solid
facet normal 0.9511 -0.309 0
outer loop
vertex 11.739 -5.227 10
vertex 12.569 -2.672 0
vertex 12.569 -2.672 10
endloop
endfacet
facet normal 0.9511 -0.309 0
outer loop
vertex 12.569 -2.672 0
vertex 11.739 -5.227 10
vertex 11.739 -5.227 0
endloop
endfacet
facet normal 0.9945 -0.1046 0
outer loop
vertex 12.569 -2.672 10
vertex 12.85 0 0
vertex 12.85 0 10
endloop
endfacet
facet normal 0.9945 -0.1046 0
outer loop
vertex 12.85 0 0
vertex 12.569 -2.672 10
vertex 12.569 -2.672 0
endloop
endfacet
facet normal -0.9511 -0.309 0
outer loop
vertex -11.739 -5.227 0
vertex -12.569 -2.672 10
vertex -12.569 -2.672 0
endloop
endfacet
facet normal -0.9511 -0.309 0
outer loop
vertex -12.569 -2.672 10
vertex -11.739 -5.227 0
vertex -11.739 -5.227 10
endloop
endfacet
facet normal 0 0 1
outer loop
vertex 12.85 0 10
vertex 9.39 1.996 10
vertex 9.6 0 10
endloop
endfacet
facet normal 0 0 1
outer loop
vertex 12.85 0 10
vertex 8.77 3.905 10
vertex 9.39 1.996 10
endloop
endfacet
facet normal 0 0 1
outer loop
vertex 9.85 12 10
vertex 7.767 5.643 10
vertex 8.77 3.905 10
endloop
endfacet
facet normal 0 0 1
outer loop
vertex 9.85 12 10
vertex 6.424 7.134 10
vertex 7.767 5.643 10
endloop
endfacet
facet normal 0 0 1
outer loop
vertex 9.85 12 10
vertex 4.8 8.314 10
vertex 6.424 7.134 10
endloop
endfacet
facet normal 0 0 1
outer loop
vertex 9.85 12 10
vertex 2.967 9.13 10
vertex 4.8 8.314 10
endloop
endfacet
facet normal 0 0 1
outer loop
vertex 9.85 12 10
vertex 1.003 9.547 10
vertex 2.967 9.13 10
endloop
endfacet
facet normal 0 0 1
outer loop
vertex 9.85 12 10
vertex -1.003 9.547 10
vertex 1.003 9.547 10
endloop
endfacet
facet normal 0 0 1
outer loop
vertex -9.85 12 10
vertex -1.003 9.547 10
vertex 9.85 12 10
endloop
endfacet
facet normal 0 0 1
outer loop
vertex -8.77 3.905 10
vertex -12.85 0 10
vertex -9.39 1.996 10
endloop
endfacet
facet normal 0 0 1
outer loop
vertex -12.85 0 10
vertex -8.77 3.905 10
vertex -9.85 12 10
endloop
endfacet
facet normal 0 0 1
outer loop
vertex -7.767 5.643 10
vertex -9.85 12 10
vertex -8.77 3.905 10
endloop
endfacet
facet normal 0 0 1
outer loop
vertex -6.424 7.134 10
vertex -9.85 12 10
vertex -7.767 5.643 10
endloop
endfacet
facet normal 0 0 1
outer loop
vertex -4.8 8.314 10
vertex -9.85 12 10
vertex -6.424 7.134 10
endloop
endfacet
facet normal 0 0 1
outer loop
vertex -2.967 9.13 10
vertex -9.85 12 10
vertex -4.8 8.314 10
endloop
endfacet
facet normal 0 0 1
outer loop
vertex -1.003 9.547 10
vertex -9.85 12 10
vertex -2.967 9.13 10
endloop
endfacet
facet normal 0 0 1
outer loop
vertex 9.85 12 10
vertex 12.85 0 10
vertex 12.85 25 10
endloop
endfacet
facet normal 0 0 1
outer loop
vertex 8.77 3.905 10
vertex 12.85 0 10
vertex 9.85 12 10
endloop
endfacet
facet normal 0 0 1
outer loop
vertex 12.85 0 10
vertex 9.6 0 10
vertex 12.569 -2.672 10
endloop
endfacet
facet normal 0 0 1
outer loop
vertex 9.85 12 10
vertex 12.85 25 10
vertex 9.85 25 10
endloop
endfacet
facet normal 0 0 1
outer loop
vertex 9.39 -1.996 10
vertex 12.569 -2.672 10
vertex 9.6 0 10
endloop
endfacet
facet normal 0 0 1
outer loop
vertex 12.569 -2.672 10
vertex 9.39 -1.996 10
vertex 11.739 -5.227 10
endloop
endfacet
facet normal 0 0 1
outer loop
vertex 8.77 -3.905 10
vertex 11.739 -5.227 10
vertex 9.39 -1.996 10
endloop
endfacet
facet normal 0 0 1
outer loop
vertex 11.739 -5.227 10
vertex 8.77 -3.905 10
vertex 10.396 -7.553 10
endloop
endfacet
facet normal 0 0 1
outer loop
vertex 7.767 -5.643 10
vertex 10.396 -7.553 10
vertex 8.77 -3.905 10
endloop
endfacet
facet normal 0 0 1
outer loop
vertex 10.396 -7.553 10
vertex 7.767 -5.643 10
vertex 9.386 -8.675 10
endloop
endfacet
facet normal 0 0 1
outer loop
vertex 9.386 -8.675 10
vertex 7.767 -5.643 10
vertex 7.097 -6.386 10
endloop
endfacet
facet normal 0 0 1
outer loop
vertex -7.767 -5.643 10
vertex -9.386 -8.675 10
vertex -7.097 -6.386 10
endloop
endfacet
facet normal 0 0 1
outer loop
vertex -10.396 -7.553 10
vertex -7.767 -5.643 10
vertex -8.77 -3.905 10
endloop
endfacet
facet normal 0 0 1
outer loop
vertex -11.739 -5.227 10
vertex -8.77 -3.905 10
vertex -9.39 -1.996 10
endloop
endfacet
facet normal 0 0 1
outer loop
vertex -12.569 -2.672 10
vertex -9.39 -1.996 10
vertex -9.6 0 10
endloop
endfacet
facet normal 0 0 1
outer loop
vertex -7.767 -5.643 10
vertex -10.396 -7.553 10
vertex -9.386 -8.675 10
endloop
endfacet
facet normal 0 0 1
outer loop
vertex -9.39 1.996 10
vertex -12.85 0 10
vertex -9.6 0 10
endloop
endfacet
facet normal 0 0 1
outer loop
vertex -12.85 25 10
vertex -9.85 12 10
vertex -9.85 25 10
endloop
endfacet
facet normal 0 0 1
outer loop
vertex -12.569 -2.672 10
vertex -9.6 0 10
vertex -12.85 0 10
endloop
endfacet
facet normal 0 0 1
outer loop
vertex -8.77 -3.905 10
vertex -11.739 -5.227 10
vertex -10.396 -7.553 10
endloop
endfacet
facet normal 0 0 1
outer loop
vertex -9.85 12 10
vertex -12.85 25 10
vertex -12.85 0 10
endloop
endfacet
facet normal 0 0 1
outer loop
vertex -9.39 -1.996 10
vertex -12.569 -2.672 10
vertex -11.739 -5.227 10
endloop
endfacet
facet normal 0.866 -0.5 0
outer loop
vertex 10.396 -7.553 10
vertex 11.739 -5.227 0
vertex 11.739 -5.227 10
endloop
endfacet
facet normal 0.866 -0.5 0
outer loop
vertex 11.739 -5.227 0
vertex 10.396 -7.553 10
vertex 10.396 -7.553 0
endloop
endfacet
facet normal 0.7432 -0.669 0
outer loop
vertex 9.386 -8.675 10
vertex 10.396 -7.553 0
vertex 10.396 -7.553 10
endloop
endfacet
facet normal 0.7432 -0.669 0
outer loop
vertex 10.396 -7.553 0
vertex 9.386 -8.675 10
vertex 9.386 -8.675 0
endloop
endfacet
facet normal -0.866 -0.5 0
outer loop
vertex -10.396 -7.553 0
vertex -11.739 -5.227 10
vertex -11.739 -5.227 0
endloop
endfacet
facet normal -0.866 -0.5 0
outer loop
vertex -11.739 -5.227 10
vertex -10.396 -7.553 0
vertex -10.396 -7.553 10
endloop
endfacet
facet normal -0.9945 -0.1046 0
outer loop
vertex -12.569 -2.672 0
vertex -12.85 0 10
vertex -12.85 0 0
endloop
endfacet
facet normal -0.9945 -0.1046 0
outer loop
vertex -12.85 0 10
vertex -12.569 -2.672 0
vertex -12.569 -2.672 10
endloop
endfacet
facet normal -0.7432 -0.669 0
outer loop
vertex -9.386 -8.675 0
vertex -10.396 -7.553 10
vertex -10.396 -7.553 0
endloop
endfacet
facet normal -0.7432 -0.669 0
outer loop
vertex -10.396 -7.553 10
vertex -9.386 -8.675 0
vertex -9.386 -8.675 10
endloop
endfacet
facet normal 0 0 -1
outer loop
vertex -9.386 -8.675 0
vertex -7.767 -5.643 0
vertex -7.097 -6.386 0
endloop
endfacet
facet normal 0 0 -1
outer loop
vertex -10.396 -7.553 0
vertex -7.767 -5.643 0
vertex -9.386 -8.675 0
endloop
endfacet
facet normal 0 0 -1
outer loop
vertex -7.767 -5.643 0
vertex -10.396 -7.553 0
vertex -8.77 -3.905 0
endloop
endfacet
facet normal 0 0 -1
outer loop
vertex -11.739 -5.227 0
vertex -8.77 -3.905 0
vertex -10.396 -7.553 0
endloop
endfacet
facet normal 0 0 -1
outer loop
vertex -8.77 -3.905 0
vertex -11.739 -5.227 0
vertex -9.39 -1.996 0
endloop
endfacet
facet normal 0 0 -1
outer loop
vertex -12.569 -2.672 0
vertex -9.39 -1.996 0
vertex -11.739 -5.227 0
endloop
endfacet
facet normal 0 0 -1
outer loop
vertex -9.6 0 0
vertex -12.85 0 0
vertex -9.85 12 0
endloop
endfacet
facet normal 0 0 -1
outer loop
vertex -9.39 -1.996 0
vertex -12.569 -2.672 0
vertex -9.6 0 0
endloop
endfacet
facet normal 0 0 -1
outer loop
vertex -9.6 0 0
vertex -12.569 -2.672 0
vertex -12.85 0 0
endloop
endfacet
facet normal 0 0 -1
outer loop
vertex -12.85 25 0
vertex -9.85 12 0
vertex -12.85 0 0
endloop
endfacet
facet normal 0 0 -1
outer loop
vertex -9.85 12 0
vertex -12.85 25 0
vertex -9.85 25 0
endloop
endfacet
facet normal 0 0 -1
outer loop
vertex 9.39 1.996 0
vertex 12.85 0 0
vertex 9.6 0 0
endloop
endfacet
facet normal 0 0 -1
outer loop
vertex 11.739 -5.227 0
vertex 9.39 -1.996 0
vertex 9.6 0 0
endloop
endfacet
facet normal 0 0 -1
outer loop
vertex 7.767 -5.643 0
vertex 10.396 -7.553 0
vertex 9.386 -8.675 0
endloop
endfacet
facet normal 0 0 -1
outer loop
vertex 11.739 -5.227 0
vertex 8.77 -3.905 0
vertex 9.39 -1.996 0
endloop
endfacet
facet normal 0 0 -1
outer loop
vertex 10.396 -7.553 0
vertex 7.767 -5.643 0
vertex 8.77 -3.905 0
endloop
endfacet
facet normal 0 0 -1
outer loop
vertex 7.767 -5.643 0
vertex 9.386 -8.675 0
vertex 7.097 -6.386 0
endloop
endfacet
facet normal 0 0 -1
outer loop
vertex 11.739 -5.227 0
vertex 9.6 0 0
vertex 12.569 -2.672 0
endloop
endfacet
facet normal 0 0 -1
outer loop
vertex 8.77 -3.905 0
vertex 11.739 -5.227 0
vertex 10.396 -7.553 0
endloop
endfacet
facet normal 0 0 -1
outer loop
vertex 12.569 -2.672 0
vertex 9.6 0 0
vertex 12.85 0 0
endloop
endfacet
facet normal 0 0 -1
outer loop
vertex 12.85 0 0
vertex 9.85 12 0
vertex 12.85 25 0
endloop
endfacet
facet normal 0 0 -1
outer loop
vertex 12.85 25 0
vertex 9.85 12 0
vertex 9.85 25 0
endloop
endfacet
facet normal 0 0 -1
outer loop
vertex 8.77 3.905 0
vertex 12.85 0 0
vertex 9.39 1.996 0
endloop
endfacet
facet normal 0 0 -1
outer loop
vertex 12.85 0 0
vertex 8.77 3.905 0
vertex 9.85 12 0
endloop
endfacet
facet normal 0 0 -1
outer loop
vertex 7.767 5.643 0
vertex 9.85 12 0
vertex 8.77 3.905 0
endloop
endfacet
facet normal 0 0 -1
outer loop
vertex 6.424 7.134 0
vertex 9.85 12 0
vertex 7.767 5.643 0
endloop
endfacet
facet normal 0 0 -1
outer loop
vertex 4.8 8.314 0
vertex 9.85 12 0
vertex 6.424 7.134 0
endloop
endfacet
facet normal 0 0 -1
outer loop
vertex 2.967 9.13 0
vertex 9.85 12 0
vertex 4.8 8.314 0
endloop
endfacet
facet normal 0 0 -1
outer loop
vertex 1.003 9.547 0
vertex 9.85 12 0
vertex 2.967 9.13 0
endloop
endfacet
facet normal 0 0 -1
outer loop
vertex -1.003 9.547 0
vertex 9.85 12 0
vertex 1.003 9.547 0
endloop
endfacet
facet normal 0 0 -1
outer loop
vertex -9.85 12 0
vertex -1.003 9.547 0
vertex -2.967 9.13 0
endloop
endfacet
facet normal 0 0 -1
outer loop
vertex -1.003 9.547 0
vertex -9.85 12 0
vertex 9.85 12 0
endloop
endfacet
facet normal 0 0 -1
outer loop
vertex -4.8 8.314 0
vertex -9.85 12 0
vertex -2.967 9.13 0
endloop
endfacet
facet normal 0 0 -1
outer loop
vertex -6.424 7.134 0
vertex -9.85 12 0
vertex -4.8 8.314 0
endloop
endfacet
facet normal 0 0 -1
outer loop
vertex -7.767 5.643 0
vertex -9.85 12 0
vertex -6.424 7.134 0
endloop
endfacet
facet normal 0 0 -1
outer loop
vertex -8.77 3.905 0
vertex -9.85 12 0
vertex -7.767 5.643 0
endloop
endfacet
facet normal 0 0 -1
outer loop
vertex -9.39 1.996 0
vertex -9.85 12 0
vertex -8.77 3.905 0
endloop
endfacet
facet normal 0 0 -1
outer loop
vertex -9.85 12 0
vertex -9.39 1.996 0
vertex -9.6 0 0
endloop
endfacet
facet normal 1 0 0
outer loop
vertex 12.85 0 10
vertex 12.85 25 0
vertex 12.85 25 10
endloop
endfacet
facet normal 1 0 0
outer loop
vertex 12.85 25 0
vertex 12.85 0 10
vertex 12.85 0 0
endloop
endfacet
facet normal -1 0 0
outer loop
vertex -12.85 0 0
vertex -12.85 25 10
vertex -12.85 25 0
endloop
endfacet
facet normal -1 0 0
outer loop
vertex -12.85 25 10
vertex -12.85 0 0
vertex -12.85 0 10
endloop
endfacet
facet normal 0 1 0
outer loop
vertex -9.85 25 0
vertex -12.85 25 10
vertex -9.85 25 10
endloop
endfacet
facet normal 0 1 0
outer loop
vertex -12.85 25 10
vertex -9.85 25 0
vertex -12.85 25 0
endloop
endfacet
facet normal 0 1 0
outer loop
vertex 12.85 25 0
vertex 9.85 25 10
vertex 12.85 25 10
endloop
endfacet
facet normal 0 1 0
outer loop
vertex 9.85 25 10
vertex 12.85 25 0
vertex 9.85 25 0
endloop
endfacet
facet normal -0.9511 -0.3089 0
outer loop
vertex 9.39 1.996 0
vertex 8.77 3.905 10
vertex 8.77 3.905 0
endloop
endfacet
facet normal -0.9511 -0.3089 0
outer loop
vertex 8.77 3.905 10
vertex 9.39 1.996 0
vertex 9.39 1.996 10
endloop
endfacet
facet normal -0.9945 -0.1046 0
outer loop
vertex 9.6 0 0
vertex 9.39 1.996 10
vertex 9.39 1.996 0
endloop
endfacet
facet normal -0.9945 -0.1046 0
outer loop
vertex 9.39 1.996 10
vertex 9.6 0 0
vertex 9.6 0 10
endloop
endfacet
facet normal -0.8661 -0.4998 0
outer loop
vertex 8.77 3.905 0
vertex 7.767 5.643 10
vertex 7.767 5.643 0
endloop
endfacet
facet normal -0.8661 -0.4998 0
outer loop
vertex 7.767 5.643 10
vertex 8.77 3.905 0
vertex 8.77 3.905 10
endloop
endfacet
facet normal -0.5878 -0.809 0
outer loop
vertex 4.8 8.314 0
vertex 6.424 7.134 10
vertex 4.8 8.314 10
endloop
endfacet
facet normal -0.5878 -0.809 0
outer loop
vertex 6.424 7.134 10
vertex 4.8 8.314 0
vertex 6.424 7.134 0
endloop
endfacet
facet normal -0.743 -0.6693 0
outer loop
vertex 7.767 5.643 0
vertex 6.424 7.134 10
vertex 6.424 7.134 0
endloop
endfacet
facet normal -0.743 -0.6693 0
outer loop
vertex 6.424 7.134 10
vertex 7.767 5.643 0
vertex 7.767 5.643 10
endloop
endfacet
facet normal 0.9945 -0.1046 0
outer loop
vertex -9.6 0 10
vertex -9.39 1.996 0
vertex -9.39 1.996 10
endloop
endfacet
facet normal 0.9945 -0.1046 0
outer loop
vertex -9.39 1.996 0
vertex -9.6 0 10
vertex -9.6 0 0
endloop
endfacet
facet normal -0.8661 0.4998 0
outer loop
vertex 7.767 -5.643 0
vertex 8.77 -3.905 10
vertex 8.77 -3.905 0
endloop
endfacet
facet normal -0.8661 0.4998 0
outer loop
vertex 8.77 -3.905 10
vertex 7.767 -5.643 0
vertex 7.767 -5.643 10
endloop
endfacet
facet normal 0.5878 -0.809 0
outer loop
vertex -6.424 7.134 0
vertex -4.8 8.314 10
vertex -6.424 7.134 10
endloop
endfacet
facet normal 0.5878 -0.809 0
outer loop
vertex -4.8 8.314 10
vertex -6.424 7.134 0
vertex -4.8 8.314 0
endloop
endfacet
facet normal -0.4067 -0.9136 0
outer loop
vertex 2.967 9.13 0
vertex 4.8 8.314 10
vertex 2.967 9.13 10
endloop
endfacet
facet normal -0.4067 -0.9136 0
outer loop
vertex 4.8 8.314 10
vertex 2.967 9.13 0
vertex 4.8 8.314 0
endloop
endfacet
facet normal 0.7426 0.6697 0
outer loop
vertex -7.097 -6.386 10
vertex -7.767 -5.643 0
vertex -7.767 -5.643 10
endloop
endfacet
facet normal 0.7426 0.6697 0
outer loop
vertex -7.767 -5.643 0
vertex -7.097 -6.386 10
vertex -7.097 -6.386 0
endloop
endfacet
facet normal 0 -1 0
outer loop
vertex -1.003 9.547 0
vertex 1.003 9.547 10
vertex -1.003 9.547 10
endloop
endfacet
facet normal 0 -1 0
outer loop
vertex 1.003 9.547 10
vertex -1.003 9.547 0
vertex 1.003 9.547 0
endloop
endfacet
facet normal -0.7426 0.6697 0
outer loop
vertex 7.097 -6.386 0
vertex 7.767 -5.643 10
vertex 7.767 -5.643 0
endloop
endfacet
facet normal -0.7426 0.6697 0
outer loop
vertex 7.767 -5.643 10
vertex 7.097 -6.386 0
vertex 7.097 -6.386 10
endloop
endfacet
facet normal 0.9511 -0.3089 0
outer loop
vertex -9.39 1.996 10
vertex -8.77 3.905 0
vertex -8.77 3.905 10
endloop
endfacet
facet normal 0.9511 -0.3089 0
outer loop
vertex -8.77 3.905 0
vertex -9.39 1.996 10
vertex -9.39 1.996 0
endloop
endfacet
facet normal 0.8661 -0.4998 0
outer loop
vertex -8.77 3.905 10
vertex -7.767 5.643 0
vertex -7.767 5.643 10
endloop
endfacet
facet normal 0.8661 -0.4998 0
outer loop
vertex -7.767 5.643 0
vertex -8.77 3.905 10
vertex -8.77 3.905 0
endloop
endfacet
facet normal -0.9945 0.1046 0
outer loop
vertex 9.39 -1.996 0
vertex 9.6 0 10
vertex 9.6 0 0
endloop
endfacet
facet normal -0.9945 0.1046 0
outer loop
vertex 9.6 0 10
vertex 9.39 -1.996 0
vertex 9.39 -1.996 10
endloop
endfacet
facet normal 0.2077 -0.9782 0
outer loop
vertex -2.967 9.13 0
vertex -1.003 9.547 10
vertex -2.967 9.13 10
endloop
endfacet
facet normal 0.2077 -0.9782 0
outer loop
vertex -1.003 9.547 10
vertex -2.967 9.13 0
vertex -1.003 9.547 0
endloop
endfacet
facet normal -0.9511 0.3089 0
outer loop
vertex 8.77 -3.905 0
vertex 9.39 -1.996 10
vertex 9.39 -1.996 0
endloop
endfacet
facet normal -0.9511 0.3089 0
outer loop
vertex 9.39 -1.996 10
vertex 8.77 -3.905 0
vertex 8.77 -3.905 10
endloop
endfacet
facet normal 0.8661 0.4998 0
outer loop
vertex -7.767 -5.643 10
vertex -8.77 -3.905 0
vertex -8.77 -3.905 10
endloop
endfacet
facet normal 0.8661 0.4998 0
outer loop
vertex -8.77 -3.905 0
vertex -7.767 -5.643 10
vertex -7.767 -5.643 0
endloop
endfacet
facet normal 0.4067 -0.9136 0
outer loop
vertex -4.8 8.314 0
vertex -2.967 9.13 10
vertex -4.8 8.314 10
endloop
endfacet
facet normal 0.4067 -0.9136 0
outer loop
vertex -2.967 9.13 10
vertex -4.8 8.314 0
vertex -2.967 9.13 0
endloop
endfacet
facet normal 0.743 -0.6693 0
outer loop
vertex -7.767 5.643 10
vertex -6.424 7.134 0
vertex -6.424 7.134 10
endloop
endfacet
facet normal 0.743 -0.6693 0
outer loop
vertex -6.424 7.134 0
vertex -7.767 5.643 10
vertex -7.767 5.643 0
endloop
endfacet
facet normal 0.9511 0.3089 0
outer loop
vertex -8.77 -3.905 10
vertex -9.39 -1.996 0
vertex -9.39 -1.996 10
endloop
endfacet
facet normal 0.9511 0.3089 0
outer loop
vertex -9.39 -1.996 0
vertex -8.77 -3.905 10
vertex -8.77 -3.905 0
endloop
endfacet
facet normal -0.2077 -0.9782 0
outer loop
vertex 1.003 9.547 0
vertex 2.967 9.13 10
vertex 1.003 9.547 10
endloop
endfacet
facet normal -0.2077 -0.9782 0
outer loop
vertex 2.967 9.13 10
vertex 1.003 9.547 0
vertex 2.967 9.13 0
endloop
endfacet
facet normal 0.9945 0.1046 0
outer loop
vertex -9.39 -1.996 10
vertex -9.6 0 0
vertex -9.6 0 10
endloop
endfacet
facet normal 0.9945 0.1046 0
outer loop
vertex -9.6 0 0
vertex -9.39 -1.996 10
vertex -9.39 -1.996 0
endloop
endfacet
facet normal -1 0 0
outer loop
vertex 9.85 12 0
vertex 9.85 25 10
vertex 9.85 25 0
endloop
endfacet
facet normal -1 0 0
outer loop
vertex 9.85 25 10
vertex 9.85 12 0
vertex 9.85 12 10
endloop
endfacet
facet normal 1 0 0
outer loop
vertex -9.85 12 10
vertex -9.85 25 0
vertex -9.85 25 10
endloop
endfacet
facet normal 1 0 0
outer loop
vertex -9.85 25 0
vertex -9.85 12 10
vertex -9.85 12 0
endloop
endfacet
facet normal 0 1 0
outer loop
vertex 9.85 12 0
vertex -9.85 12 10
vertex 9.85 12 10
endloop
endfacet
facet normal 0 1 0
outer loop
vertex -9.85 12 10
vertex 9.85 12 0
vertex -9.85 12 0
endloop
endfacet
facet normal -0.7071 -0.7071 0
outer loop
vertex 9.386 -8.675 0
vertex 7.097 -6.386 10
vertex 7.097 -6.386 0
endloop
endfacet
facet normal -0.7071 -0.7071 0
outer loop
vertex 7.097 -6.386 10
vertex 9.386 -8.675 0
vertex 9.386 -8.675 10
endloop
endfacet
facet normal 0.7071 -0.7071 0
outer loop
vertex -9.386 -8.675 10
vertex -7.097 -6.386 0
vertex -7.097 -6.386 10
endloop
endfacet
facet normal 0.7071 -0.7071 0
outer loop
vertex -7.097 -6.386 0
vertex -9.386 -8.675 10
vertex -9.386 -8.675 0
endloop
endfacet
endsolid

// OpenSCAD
// file: lib.scad
inch = 25.4;
OD = 24.5; // od of lager tube
snug_id_small = 19.7;
insert_diameter = 24.25;

module tube(od, id, h){
  difference(){
    color([1, .3, .6])cylinder(d=od, h=h);
    translate([0, 0, -1])cylinder(d=id, h=h + 2);
  }
}
// main file
include <lib.scad>

H = 10;
thickness = 3;

difference(){
  union(){
    cylinder(d=snug_id_small + 2 * thickness, h=H);
    translate([-(snug_id_small + 2 * thickness) / 2, 0, 0])cube([snug_id_small + 2 * thickness, 25, H]);
  }
  translate([0, 0, -1])cylinder(d=snug_id_small - .5, h=H+2);
  translate([-snug_id_small / 2, 12, -1])cube([snug_id_small, 25, H + 2]);
#translate([0, -70, 0])rotate([0, 0, 45])translate([-50, -50, -1])cube([100, 100, H+2]);
}
